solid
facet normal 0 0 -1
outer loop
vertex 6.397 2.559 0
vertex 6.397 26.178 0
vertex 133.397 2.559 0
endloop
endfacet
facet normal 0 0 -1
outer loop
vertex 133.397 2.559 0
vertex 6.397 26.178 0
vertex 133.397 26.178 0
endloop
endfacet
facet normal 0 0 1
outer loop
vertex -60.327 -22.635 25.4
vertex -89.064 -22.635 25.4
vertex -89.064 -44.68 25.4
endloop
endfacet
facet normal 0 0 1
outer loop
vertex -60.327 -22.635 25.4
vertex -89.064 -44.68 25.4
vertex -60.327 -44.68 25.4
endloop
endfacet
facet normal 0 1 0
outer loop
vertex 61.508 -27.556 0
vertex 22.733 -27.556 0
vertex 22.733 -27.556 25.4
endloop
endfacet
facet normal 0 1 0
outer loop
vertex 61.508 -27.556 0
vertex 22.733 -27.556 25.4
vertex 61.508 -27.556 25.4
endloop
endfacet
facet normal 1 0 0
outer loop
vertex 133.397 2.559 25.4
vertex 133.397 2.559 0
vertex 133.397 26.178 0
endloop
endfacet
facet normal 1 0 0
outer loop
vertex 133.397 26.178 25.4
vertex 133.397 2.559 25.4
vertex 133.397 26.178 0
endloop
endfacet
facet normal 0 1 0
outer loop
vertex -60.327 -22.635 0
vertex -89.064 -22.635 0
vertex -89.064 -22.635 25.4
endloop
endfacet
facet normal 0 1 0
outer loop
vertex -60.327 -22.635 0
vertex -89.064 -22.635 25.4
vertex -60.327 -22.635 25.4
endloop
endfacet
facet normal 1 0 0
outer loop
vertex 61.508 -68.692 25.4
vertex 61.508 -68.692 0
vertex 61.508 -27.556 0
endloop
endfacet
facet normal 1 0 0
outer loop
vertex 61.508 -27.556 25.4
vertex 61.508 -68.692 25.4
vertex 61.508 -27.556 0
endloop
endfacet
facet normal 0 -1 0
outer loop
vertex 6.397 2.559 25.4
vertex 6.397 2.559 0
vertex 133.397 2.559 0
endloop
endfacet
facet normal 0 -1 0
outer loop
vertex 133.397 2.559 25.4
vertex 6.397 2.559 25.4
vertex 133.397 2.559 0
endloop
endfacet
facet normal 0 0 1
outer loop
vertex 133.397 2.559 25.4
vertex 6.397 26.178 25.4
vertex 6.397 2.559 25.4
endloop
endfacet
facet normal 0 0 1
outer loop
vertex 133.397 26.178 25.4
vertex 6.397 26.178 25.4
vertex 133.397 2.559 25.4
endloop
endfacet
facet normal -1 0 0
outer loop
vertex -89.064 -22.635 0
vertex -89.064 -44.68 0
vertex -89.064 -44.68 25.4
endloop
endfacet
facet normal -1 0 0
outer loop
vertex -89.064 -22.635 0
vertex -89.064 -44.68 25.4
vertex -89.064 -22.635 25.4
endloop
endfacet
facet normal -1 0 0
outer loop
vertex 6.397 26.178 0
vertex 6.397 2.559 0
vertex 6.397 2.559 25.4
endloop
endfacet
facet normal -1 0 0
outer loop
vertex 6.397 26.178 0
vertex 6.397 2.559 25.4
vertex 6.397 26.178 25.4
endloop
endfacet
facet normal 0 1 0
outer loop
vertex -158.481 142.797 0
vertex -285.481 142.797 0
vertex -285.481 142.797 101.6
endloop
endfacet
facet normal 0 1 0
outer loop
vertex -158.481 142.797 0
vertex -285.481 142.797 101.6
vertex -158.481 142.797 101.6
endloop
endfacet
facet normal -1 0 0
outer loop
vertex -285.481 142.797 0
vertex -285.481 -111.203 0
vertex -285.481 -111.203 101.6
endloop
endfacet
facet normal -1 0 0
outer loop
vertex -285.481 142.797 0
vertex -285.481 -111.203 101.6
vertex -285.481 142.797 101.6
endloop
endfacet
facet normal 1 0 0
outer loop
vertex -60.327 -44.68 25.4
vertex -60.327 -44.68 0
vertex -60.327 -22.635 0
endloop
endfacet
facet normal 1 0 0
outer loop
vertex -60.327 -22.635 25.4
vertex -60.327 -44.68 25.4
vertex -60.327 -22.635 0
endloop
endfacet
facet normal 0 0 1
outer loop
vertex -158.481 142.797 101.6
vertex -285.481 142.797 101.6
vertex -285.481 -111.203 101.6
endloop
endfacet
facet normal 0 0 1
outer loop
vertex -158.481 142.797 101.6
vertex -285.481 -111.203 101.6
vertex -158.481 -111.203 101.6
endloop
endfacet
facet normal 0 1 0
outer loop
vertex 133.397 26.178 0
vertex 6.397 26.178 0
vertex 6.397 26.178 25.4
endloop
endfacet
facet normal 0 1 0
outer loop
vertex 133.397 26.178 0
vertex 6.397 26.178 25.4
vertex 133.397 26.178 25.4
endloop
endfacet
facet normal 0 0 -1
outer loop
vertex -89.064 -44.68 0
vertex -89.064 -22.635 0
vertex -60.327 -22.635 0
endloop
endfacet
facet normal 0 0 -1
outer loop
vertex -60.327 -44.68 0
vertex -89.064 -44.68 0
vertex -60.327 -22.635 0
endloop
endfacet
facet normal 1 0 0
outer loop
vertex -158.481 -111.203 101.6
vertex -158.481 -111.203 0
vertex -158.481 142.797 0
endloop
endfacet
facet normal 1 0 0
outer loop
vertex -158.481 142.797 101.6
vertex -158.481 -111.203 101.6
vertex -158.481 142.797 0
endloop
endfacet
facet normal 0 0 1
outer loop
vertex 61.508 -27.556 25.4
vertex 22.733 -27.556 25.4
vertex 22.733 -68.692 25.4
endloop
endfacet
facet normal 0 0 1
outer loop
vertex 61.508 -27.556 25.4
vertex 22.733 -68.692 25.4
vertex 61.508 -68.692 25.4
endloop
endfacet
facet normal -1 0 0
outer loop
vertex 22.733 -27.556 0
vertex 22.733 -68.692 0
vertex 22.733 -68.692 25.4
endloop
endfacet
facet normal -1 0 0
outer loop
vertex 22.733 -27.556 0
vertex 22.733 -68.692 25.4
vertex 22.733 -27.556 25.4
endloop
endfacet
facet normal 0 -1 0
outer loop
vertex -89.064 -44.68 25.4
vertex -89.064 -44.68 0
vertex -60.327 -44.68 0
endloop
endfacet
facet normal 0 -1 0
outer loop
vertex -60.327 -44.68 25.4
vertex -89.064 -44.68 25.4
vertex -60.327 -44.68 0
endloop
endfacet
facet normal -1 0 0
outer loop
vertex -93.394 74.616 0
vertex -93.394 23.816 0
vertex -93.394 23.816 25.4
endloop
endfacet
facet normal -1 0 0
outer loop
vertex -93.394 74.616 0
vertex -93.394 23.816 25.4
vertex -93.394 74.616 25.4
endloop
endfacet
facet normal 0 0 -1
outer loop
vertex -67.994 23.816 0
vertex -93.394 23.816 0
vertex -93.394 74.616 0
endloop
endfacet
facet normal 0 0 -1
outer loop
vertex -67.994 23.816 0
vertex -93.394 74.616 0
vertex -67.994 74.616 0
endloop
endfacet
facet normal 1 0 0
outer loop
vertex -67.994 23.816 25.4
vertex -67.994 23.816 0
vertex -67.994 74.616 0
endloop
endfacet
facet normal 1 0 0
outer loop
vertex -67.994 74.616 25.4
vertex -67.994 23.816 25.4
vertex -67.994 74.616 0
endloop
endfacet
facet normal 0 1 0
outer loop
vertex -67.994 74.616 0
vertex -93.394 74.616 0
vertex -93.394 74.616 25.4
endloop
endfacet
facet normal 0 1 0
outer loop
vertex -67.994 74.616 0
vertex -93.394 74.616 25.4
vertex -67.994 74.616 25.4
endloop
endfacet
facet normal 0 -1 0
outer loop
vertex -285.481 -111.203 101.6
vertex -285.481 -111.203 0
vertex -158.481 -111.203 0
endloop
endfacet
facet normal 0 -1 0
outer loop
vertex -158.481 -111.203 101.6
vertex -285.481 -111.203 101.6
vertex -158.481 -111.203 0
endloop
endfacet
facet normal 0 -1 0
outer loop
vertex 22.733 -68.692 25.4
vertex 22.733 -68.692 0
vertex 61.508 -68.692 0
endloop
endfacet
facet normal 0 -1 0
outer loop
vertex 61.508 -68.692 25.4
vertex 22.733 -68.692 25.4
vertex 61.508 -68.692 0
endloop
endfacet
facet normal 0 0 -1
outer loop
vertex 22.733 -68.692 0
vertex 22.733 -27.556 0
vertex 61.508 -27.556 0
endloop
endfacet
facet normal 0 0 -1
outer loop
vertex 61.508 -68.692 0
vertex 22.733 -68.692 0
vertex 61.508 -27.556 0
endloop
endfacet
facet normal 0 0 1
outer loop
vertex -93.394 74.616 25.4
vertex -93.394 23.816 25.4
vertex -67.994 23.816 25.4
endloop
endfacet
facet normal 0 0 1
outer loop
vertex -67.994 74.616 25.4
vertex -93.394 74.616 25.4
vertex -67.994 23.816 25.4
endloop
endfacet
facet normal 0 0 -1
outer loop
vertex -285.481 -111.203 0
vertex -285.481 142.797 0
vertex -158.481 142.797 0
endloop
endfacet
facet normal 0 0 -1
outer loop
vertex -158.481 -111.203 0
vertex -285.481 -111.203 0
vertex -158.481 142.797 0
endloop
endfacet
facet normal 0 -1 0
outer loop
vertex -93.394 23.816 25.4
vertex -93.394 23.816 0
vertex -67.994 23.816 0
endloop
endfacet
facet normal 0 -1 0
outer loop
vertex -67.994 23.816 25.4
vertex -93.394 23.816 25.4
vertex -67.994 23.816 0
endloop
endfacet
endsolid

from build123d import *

# Parameters (mm, degrees)
F0_W     = 25.4
F0_H     = 50.8
F0_W_2   = 127
F0_H_2   = 23.619188
F0_W_3   = 38.774828
F0_H_3   = 41.136755
F0_W_4   = 28.73668
F0_H_4   = 22.044578
F1_DEPTH = 25.4
F2_W     = 127
F2_H     = 254
F3_DEPTH = 101.6


with BuildPart() as f1:
    # F0 (on Top) → F1 (new body)
    with BuildSketch(Plane.XY):
        with Locations((-80.694205, 49.216016)):
            Rectangle(F0_W, F0_H)
        with Locations((69.896862, 14.368339)):
            Rectangle(F0_W_2, F0_H_2)
        with Locations((42.120884, -48.124099)):
            Rectangle(F0_W_3, F0_H_3)
        with Locations((-74.695684, -33.657345)):
            Rectangle(F0_W_4, F0_H_4)
    extrude(amount=F1_DEPTH)


with BuildPart() as f3:
    # F2 (on Top) → F3 (new body)
    with BuildSketch(Plane.XY):
        with Locations((-221.981157, 15.797222)):
            Rectangle(F2_W, F2_H)
    extrude(amount=F3_DEPTH)


solid = Compound([f1.part, f3.part])
